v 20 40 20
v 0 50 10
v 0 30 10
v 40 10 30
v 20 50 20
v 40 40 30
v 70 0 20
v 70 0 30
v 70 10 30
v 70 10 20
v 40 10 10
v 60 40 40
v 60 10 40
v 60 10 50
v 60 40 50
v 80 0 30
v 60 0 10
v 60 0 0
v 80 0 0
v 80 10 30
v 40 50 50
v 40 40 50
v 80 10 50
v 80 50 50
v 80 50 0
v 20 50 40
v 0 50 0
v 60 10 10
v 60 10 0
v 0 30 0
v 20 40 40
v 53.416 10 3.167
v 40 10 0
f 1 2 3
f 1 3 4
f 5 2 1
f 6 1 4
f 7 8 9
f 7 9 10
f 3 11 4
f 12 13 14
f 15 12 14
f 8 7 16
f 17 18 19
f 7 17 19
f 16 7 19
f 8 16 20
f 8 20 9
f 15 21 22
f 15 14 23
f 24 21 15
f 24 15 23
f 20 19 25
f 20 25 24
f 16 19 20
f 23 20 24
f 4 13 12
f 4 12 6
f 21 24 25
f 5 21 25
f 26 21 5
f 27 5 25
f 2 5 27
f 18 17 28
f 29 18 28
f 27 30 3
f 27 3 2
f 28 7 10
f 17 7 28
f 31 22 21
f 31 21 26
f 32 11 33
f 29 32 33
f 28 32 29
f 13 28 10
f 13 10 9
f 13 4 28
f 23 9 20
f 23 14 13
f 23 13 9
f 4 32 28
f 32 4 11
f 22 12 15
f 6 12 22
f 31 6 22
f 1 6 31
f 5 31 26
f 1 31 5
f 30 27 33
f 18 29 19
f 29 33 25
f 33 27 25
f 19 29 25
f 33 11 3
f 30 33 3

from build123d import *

# Parameters (mm, degrees)
SKETCH1_W            = 80
SKETCH1_H            = 50
BOSS_EXTRUDE1_DEPTH  = 10
SKETCH2_W            = 60
SKETCH2_H            = 10
CUT_EXTRUDE1_DEPTH   = 10
CUT_EXTRUDE2_DEPTH   = 10
BOSS_EXTRUDE2_DEPTH  = 10
BOSS_EXTRUDE4_DEPTH  = 40
SKETCH7_W            = 20
SKETCH7_H            = 10
BOSS_EXTRUDE5_DEPTH  = 40
SKETCH8_W            = 40
SKETCH8_H            = 10
BOSS_EXTRUDE6_DEPTH  = 40
BOSS_EXTRUDE7_DEPTH  = 10
BOSS_EXTRUDE8_DEPTH  = 30
BOSS_EXTRUDE9_DEPTH  = 30
BOSS_EXTRUDE11_DEPTH = 20
SKETCH14_W           = 80
SKETCH14_H           = 57.926255319
CUT_EXTRUDE3_DEPTH   = 20
BOSS_EXTRUDE12_DEPTH = 10


with BuildPart() as part:
    # Sketch1 → Boss-Extrude1 (new body)
    with BuildSketch(Plane.XY):
        with Locations((40, 25)):
            Rectangle(SKETCH1_W, SKETCH1_H)
    extrude(amount=BOSS_EXTRUDE1_DEPTH)

    # Sketch2 → Cut-Extrude1 (cut)
    with BuildSketch(Plane.XY.offset(10)):
        with Locations((30, 5)):
            Rectangle(SKETCH2_W, SKETCH2_H)
    extrude(amount=-CUT_EXTRUDE1_DEPTH, mode=Mode.SUBTRACT)

    # Sketch3 → Cut-Extrude2 (cut)
    with BuildSketch(Plane.XY.offset(10)):
        Polygon((40, 10), (0, 30), (0, 10), align=None)
    extrude(amount=-CUT_EXTRUDE2_DEPTH, mode=Mode.SUBTRACT)

    # Sketch4 → Boss-Extrude2 (add)
    with BuildSketch(Plane.XZ):
        Polygon((80, 0), (80, 30), (70, 30), (70, 20), (60, 10), (60, 0), align=None)
    extrude(amount=-BOSS_EXTRUDE2_DEPTH)

    # Sketch6 → Boss-Extrude4 (add)
    with BuildSketch(Plane.XZ.offset(-10)):
        Polygon((40, 10), (80, 10), (80, 40), (60, 40), (40, 30), align=None)
    extrude(amount=-BOSS_EXTRUDE4_DEPTH)

    # Sketch7 → Boss-Extrude5 (add)
    with BuildSketch(Plane.XZ.offset(-10)):
        with Locations((70, 45)):
            Rectangle(SKETCH7_W, SKETCH7_H)
    extrude(amount=-BOSS_EXTRUDE5_DEPTH)

    # Sketch8 → Boss-Extrude6 (add)
    with BuildSketch(Plane.XY.offset(50)):
        with Locations((60, 45)):
            Rectangle(SKETCH8_W, SKETCH8_H)
    extrude(amount=-BOSS_EXTRUDE6_DEPTH)

    # Sketch9 → Boss-Extrude7 (add)
    with BuildSketch(Plane(origin=(0, 40, 0), x_dir=(-1, 0, 0), z_dir=(0, -1, 0))):
        Polygon((-40, -50), (-20, -40), (-20, -23.413516985), (-20, -3.413516985), (-40, -3.413516985), align=None)
    extrude(amount=-BOSS_EXTRUDE7_DEPTH)

    # Sketch10 → Boss-Extrude8 (add)
    with BuildSketch(Plane(origin=(-4, 0, 8), x_dir=(-0.894427191, 0, -0.447213595), z_dir=(0.447213595, 0, -0.894427191))):
        Polygon((-71.55417528, 40), (-71.55417528, 10), (-4.472135955, 30), (-4.472135955, 50), (-49.193495505, 40), align=None)
    extrude(amount=BOSS_EXTRUDE8_DEPTH)

    # Sketch11 → Boss-Extrude9 (add)
    with BuildSketch(Plane(origin=(-4, 0, 8), x_dir=(-0.894427191, 0, -0.447213595), z_dir=(0.447213595, 0, -0.894427191))):
        Polygon((-49.193495505, 10), (-49.193495505, 16.666666667), (-4.472135955, 30), align=None)
    extrude(amount=BOSS_EXTRUDE9_DEPTH)

    # Sketch13 → Boss-Extrude11 (add)
    with BuildSketch(Plane(origin=(12, 24, 0), x_dir=(-0.894427191, 0.447213595, 0), z_dir=(-0.447213595, -0.894427191, 0))):
        Polygon((-31.304951685, -10), (-31.304951685, -30), (13.416407865, -10), align=None)
    extrude(amount=-BOSS_EXTRUDE11_DEPTH)

    # Sketch14 → Cut-Extrude3 (cut)
    with BuildSketch(Plane(origin=(0, 0, 0), x_dir=(-1, 0, 0), z_dir=(0, 0, -1))):
        with Locations((-40, 21.036872341)):
            Rectangle(SKETCH14_W, SKETCH14_H)
    extrude(amount=CUT_EXTRUDE3_DEPTH, mode=Mode.SUBTRACT)

    # Sketch15 → Boss-Extrude12 (add)
    with BuildSketch(Plane(origin=(-4, 0, 8), x_dir=(-0.894427191, 0, -0.447213595), z_dir=(0.447213595, 0, -0.894427191))):
        Polygon((-4.472135955, 50), (-26.83281573, 40), (-26.83281573, 50), align=None)
    extrude(amount=BOSS_EXTRUDE12_DEPTH)


solid = part.part
